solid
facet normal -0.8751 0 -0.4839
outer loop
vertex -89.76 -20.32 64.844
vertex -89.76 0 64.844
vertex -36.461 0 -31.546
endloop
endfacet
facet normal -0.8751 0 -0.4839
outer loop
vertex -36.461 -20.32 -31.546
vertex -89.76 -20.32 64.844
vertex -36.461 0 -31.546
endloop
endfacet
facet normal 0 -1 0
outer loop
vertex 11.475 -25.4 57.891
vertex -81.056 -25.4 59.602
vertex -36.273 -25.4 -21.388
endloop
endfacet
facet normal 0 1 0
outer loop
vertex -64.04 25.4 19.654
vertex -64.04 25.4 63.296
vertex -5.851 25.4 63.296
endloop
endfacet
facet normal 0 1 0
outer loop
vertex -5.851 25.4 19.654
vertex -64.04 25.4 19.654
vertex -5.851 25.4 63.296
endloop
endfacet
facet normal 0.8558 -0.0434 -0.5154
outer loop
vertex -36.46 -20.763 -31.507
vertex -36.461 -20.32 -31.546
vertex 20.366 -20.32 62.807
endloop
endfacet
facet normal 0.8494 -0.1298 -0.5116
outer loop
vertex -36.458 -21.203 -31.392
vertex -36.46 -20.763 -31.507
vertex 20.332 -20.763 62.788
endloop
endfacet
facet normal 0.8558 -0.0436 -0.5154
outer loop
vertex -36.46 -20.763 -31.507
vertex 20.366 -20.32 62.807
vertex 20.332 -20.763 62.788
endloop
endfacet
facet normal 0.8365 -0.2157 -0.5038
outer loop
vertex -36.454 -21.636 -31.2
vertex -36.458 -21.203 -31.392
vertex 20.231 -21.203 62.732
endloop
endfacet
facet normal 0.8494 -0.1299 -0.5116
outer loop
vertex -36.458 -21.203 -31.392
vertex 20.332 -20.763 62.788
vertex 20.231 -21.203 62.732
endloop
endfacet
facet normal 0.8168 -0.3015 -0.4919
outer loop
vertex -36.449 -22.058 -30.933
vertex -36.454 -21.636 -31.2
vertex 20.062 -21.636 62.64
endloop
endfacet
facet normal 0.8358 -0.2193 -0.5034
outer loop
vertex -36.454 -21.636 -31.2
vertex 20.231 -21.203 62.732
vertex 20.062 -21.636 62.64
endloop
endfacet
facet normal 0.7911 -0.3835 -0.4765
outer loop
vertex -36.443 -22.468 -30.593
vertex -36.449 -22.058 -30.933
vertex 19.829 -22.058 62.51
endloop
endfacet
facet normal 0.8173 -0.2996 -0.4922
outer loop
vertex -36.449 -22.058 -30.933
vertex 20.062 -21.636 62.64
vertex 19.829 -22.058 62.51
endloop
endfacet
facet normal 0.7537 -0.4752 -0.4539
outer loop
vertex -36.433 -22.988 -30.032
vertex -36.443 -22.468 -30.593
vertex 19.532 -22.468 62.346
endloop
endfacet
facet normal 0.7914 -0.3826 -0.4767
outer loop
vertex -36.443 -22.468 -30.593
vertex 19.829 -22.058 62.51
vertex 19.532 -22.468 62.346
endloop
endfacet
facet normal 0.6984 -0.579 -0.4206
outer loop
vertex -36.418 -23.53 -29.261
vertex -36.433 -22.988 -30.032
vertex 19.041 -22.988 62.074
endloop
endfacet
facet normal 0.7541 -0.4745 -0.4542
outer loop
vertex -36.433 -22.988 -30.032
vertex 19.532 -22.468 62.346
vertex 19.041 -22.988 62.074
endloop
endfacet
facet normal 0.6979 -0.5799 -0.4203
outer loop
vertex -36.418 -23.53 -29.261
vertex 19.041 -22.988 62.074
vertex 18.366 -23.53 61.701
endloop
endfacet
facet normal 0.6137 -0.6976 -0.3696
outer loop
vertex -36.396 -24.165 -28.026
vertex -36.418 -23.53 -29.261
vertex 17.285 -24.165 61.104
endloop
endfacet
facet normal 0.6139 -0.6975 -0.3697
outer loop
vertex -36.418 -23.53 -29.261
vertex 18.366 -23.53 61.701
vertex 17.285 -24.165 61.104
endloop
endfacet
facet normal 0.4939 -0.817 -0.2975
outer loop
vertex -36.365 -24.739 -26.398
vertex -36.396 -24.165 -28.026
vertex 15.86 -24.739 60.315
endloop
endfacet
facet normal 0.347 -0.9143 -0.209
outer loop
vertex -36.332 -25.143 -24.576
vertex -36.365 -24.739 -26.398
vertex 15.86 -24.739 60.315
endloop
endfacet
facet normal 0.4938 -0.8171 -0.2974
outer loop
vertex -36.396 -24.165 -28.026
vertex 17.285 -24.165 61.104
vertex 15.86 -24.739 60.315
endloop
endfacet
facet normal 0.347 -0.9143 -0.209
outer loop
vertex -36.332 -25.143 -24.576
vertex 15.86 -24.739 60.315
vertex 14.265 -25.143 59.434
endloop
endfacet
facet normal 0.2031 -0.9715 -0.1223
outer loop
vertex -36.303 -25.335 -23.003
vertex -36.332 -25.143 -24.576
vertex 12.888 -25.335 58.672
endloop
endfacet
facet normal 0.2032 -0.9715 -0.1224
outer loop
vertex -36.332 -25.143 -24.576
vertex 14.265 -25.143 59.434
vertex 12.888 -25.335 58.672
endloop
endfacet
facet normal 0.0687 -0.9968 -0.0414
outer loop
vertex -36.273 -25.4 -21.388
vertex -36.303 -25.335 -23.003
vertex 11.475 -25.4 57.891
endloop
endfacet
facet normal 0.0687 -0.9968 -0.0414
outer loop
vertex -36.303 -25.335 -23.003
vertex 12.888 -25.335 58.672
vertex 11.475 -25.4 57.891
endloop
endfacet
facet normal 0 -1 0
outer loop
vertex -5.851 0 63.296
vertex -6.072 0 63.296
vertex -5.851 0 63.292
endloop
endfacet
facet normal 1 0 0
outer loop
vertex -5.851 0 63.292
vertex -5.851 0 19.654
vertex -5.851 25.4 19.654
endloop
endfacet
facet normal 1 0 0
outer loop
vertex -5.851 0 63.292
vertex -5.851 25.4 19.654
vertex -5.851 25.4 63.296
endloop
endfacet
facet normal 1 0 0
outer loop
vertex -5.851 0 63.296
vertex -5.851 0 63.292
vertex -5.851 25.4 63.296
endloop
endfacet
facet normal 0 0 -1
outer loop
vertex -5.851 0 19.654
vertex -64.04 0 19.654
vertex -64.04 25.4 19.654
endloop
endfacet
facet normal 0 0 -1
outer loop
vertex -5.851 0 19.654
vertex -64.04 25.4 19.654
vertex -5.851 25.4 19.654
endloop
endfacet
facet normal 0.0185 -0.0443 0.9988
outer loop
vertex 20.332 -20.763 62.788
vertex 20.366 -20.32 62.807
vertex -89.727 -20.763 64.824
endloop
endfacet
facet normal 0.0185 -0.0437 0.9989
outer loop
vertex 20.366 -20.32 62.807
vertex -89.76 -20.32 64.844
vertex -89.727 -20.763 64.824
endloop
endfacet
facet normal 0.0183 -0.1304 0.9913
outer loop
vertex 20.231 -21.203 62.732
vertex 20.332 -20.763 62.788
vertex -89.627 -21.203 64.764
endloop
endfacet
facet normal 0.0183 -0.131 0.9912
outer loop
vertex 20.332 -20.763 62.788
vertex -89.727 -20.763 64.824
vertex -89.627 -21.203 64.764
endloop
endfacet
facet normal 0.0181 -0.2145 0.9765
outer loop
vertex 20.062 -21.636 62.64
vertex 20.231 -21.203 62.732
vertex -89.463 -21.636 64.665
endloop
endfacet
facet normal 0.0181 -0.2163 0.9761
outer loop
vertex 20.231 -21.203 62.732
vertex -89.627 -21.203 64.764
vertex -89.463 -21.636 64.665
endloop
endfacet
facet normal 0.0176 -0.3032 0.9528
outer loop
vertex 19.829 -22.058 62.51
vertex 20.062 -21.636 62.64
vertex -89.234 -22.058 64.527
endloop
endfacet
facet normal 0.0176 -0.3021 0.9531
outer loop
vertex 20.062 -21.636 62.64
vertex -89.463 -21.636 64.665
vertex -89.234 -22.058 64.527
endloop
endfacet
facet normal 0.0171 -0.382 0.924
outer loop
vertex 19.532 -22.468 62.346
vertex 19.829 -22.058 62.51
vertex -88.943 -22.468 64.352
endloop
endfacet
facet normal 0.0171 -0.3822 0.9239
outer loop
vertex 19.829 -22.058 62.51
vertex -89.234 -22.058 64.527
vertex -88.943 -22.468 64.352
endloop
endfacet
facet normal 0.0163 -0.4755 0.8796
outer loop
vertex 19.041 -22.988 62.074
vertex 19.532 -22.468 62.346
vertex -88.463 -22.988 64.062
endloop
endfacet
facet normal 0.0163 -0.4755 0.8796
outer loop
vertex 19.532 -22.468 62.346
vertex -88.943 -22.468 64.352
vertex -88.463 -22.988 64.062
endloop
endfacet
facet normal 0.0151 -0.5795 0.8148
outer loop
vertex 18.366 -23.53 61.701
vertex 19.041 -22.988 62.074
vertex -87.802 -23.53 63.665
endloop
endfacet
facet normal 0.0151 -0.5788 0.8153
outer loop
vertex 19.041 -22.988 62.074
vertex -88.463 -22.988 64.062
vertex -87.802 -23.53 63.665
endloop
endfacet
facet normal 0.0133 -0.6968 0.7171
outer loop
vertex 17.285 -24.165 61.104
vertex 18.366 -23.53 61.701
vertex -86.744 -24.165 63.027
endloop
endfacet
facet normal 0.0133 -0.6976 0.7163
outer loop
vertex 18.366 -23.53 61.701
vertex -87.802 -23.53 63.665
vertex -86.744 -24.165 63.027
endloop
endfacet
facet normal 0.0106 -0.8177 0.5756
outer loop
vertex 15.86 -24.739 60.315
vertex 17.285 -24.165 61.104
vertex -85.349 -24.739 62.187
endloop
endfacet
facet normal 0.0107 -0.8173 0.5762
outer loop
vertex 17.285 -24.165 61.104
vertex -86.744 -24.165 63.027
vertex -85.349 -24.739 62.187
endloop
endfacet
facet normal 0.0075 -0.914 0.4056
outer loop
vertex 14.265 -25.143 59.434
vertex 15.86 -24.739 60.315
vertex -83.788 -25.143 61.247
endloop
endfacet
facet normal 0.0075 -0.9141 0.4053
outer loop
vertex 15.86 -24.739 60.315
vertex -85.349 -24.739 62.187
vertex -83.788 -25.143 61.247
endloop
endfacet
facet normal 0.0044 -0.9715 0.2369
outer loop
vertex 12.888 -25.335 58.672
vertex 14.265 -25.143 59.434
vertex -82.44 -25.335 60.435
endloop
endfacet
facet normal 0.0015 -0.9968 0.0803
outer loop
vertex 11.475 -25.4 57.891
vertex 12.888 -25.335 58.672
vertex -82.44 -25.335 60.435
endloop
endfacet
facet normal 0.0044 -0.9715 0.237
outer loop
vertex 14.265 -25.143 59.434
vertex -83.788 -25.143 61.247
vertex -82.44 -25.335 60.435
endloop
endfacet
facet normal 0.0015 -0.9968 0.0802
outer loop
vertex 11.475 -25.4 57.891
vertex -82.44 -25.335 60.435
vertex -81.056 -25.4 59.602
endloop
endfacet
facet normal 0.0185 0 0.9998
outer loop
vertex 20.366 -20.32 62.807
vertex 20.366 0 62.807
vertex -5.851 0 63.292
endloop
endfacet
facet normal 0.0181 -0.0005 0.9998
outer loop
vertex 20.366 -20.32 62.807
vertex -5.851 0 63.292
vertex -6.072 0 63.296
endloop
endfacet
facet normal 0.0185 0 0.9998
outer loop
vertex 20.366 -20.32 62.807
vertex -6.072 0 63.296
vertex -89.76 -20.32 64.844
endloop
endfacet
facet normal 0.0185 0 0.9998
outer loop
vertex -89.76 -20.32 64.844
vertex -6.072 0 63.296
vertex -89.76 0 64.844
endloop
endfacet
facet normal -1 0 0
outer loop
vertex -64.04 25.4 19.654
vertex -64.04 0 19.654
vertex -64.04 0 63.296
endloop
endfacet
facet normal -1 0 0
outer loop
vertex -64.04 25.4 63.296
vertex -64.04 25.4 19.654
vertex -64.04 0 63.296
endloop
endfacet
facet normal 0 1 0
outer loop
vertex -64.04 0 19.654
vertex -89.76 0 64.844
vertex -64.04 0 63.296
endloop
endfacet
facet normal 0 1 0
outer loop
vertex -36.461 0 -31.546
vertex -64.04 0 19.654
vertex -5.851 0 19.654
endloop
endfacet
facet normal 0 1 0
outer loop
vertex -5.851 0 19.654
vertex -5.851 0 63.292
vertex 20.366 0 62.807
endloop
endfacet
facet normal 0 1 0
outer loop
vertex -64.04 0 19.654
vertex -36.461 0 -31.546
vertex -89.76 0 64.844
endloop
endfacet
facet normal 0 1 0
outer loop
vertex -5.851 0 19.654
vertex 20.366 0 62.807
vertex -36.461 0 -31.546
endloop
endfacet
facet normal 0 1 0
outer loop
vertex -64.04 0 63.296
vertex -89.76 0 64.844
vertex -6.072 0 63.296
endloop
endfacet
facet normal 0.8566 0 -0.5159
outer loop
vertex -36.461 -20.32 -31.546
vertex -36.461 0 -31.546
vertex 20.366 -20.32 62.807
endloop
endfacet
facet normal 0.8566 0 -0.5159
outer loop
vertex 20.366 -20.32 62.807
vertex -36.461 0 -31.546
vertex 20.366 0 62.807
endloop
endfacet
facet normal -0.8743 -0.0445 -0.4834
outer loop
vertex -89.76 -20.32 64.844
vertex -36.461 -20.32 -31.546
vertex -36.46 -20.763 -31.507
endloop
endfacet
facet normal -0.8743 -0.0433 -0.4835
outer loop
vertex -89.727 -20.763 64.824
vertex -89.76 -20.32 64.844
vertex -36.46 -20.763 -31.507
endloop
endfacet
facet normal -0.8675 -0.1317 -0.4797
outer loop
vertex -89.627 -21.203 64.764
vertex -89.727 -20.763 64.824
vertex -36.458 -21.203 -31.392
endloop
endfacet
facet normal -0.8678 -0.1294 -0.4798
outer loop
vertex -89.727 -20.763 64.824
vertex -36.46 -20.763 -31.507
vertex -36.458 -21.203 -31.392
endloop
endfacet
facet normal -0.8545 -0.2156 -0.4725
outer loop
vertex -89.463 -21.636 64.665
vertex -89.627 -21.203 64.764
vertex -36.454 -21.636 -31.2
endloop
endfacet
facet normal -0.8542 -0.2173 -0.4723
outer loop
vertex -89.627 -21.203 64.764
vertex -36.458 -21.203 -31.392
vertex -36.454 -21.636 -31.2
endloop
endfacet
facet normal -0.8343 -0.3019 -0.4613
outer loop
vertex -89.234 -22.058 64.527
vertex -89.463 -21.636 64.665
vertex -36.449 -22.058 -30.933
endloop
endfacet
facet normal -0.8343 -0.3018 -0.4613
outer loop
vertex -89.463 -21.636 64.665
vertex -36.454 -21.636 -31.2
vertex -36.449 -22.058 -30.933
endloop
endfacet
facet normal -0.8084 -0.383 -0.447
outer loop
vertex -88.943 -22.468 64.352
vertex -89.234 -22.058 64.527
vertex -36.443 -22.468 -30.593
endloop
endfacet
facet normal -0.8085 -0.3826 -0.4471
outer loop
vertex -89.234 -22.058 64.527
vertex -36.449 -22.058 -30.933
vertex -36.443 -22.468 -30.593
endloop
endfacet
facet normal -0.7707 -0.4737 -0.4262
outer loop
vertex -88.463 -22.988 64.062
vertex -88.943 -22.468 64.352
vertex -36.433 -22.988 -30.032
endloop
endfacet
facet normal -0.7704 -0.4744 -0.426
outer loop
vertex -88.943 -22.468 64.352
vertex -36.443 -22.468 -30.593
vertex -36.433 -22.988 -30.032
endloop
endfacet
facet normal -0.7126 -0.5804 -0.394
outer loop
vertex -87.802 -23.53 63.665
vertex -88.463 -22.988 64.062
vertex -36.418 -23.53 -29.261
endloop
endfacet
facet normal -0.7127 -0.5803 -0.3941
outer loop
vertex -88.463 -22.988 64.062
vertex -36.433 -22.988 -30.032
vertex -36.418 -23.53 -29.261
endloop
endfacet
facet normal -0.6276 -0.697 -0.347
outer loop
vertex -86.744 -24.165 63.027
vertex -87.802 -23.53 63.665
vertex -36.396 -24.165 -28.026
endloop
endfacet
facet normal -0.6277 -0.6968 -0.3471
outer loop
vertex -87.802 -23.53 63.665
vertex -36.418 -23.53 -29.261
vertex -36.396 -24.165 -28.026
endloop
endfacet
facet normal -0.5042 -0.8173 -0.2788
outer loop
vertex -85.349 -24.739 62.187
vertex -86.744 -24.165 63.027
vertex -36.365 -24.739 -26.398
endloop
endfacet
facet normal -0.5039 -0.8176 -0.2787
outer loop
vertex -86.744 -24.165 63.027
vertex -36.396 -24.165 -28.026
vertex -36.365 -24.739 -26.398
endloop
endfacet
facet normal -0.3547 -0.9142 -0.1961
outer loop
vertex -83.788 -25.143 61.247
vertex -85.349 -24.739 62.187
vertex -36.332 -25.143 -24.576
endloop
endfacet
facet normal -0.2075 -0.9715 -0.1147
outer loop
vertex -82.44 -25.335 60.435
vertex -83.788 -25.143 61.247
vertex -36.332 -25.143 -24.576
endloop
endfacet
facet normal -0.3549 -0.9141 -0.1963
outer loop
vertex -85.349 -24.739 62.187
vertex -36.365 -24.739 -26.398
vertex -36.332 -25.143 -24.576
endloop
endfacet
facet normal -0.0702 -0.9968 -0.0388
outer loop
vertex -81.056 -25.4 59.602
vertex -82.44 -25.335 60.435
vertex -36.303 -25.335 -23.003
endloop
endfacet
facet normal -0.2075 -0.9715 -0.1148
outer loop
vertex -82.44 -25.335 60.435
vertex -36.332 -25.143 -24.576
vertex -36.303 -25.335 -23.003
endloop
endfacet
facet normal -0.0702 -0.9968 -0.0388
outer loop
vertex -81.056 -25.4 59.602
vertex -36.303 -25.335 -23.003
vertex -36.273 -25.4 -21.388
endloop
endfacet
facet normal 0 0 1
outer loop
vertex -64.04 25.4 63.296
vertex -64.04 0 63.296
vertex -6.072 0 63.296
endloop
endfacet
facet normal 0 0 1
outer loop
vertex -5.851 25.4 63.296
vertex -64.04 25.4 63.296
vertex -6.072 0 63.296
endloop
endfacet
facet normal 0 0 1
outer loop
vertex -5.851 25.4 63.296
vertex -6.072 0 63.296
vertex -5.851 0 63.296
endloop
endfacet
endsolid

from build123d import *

# Parameters (mm, degrees)
F1_DEPTH = 25.4
F2_W     = 58.1890912727
F2_H     = 43.6418224126
F3_DEPTH = 25.4
F4_R     = 5.08


with BuildPart() as f1:
    # F0 (on Front) → F1 (new body)
    with BuildSketch(Plane.XZ):
        Polygon((-36.4606332477, -31.5460583245), (20.3657772835, 62.8072192942), (-89.7597633302, 64.8436956108), align=None)
    extrude(amount=F1_DEPTH)

    # F2 (on Front) + F1_face (on face) → F3 (join)
    with BuildSketch(Plane.XZ):
        with Locations((-34.9458768032, 41.4752056822)):
            Rectangle(F2_W, F2_H)
    with BuildSketch(Plane(origin=(-35.2848730981, -25.4, 32.0349521935), x_dir=(1, 0, 0), z_dir=(0, -1, 0))):
        Polygon((-1.1757601496, -63.581010518), (55.6506503816, 30.7722671007), (-54.4748902321, 32.8087434173), align=None)
    extrude(amount=-F3_DEPTH)

    # F4
    f4_edges = [f1.edges().sort_by_distance(p)[0] for p in [
        (-8.047428, -25.4, 15.63058),
        (-34.696993, -25.4, 63.825457),
        (-63.110198, -25.4, 16.648819),
    ]]
    fillet(f4_edges, radius=F4_R)


solid = f1.part
